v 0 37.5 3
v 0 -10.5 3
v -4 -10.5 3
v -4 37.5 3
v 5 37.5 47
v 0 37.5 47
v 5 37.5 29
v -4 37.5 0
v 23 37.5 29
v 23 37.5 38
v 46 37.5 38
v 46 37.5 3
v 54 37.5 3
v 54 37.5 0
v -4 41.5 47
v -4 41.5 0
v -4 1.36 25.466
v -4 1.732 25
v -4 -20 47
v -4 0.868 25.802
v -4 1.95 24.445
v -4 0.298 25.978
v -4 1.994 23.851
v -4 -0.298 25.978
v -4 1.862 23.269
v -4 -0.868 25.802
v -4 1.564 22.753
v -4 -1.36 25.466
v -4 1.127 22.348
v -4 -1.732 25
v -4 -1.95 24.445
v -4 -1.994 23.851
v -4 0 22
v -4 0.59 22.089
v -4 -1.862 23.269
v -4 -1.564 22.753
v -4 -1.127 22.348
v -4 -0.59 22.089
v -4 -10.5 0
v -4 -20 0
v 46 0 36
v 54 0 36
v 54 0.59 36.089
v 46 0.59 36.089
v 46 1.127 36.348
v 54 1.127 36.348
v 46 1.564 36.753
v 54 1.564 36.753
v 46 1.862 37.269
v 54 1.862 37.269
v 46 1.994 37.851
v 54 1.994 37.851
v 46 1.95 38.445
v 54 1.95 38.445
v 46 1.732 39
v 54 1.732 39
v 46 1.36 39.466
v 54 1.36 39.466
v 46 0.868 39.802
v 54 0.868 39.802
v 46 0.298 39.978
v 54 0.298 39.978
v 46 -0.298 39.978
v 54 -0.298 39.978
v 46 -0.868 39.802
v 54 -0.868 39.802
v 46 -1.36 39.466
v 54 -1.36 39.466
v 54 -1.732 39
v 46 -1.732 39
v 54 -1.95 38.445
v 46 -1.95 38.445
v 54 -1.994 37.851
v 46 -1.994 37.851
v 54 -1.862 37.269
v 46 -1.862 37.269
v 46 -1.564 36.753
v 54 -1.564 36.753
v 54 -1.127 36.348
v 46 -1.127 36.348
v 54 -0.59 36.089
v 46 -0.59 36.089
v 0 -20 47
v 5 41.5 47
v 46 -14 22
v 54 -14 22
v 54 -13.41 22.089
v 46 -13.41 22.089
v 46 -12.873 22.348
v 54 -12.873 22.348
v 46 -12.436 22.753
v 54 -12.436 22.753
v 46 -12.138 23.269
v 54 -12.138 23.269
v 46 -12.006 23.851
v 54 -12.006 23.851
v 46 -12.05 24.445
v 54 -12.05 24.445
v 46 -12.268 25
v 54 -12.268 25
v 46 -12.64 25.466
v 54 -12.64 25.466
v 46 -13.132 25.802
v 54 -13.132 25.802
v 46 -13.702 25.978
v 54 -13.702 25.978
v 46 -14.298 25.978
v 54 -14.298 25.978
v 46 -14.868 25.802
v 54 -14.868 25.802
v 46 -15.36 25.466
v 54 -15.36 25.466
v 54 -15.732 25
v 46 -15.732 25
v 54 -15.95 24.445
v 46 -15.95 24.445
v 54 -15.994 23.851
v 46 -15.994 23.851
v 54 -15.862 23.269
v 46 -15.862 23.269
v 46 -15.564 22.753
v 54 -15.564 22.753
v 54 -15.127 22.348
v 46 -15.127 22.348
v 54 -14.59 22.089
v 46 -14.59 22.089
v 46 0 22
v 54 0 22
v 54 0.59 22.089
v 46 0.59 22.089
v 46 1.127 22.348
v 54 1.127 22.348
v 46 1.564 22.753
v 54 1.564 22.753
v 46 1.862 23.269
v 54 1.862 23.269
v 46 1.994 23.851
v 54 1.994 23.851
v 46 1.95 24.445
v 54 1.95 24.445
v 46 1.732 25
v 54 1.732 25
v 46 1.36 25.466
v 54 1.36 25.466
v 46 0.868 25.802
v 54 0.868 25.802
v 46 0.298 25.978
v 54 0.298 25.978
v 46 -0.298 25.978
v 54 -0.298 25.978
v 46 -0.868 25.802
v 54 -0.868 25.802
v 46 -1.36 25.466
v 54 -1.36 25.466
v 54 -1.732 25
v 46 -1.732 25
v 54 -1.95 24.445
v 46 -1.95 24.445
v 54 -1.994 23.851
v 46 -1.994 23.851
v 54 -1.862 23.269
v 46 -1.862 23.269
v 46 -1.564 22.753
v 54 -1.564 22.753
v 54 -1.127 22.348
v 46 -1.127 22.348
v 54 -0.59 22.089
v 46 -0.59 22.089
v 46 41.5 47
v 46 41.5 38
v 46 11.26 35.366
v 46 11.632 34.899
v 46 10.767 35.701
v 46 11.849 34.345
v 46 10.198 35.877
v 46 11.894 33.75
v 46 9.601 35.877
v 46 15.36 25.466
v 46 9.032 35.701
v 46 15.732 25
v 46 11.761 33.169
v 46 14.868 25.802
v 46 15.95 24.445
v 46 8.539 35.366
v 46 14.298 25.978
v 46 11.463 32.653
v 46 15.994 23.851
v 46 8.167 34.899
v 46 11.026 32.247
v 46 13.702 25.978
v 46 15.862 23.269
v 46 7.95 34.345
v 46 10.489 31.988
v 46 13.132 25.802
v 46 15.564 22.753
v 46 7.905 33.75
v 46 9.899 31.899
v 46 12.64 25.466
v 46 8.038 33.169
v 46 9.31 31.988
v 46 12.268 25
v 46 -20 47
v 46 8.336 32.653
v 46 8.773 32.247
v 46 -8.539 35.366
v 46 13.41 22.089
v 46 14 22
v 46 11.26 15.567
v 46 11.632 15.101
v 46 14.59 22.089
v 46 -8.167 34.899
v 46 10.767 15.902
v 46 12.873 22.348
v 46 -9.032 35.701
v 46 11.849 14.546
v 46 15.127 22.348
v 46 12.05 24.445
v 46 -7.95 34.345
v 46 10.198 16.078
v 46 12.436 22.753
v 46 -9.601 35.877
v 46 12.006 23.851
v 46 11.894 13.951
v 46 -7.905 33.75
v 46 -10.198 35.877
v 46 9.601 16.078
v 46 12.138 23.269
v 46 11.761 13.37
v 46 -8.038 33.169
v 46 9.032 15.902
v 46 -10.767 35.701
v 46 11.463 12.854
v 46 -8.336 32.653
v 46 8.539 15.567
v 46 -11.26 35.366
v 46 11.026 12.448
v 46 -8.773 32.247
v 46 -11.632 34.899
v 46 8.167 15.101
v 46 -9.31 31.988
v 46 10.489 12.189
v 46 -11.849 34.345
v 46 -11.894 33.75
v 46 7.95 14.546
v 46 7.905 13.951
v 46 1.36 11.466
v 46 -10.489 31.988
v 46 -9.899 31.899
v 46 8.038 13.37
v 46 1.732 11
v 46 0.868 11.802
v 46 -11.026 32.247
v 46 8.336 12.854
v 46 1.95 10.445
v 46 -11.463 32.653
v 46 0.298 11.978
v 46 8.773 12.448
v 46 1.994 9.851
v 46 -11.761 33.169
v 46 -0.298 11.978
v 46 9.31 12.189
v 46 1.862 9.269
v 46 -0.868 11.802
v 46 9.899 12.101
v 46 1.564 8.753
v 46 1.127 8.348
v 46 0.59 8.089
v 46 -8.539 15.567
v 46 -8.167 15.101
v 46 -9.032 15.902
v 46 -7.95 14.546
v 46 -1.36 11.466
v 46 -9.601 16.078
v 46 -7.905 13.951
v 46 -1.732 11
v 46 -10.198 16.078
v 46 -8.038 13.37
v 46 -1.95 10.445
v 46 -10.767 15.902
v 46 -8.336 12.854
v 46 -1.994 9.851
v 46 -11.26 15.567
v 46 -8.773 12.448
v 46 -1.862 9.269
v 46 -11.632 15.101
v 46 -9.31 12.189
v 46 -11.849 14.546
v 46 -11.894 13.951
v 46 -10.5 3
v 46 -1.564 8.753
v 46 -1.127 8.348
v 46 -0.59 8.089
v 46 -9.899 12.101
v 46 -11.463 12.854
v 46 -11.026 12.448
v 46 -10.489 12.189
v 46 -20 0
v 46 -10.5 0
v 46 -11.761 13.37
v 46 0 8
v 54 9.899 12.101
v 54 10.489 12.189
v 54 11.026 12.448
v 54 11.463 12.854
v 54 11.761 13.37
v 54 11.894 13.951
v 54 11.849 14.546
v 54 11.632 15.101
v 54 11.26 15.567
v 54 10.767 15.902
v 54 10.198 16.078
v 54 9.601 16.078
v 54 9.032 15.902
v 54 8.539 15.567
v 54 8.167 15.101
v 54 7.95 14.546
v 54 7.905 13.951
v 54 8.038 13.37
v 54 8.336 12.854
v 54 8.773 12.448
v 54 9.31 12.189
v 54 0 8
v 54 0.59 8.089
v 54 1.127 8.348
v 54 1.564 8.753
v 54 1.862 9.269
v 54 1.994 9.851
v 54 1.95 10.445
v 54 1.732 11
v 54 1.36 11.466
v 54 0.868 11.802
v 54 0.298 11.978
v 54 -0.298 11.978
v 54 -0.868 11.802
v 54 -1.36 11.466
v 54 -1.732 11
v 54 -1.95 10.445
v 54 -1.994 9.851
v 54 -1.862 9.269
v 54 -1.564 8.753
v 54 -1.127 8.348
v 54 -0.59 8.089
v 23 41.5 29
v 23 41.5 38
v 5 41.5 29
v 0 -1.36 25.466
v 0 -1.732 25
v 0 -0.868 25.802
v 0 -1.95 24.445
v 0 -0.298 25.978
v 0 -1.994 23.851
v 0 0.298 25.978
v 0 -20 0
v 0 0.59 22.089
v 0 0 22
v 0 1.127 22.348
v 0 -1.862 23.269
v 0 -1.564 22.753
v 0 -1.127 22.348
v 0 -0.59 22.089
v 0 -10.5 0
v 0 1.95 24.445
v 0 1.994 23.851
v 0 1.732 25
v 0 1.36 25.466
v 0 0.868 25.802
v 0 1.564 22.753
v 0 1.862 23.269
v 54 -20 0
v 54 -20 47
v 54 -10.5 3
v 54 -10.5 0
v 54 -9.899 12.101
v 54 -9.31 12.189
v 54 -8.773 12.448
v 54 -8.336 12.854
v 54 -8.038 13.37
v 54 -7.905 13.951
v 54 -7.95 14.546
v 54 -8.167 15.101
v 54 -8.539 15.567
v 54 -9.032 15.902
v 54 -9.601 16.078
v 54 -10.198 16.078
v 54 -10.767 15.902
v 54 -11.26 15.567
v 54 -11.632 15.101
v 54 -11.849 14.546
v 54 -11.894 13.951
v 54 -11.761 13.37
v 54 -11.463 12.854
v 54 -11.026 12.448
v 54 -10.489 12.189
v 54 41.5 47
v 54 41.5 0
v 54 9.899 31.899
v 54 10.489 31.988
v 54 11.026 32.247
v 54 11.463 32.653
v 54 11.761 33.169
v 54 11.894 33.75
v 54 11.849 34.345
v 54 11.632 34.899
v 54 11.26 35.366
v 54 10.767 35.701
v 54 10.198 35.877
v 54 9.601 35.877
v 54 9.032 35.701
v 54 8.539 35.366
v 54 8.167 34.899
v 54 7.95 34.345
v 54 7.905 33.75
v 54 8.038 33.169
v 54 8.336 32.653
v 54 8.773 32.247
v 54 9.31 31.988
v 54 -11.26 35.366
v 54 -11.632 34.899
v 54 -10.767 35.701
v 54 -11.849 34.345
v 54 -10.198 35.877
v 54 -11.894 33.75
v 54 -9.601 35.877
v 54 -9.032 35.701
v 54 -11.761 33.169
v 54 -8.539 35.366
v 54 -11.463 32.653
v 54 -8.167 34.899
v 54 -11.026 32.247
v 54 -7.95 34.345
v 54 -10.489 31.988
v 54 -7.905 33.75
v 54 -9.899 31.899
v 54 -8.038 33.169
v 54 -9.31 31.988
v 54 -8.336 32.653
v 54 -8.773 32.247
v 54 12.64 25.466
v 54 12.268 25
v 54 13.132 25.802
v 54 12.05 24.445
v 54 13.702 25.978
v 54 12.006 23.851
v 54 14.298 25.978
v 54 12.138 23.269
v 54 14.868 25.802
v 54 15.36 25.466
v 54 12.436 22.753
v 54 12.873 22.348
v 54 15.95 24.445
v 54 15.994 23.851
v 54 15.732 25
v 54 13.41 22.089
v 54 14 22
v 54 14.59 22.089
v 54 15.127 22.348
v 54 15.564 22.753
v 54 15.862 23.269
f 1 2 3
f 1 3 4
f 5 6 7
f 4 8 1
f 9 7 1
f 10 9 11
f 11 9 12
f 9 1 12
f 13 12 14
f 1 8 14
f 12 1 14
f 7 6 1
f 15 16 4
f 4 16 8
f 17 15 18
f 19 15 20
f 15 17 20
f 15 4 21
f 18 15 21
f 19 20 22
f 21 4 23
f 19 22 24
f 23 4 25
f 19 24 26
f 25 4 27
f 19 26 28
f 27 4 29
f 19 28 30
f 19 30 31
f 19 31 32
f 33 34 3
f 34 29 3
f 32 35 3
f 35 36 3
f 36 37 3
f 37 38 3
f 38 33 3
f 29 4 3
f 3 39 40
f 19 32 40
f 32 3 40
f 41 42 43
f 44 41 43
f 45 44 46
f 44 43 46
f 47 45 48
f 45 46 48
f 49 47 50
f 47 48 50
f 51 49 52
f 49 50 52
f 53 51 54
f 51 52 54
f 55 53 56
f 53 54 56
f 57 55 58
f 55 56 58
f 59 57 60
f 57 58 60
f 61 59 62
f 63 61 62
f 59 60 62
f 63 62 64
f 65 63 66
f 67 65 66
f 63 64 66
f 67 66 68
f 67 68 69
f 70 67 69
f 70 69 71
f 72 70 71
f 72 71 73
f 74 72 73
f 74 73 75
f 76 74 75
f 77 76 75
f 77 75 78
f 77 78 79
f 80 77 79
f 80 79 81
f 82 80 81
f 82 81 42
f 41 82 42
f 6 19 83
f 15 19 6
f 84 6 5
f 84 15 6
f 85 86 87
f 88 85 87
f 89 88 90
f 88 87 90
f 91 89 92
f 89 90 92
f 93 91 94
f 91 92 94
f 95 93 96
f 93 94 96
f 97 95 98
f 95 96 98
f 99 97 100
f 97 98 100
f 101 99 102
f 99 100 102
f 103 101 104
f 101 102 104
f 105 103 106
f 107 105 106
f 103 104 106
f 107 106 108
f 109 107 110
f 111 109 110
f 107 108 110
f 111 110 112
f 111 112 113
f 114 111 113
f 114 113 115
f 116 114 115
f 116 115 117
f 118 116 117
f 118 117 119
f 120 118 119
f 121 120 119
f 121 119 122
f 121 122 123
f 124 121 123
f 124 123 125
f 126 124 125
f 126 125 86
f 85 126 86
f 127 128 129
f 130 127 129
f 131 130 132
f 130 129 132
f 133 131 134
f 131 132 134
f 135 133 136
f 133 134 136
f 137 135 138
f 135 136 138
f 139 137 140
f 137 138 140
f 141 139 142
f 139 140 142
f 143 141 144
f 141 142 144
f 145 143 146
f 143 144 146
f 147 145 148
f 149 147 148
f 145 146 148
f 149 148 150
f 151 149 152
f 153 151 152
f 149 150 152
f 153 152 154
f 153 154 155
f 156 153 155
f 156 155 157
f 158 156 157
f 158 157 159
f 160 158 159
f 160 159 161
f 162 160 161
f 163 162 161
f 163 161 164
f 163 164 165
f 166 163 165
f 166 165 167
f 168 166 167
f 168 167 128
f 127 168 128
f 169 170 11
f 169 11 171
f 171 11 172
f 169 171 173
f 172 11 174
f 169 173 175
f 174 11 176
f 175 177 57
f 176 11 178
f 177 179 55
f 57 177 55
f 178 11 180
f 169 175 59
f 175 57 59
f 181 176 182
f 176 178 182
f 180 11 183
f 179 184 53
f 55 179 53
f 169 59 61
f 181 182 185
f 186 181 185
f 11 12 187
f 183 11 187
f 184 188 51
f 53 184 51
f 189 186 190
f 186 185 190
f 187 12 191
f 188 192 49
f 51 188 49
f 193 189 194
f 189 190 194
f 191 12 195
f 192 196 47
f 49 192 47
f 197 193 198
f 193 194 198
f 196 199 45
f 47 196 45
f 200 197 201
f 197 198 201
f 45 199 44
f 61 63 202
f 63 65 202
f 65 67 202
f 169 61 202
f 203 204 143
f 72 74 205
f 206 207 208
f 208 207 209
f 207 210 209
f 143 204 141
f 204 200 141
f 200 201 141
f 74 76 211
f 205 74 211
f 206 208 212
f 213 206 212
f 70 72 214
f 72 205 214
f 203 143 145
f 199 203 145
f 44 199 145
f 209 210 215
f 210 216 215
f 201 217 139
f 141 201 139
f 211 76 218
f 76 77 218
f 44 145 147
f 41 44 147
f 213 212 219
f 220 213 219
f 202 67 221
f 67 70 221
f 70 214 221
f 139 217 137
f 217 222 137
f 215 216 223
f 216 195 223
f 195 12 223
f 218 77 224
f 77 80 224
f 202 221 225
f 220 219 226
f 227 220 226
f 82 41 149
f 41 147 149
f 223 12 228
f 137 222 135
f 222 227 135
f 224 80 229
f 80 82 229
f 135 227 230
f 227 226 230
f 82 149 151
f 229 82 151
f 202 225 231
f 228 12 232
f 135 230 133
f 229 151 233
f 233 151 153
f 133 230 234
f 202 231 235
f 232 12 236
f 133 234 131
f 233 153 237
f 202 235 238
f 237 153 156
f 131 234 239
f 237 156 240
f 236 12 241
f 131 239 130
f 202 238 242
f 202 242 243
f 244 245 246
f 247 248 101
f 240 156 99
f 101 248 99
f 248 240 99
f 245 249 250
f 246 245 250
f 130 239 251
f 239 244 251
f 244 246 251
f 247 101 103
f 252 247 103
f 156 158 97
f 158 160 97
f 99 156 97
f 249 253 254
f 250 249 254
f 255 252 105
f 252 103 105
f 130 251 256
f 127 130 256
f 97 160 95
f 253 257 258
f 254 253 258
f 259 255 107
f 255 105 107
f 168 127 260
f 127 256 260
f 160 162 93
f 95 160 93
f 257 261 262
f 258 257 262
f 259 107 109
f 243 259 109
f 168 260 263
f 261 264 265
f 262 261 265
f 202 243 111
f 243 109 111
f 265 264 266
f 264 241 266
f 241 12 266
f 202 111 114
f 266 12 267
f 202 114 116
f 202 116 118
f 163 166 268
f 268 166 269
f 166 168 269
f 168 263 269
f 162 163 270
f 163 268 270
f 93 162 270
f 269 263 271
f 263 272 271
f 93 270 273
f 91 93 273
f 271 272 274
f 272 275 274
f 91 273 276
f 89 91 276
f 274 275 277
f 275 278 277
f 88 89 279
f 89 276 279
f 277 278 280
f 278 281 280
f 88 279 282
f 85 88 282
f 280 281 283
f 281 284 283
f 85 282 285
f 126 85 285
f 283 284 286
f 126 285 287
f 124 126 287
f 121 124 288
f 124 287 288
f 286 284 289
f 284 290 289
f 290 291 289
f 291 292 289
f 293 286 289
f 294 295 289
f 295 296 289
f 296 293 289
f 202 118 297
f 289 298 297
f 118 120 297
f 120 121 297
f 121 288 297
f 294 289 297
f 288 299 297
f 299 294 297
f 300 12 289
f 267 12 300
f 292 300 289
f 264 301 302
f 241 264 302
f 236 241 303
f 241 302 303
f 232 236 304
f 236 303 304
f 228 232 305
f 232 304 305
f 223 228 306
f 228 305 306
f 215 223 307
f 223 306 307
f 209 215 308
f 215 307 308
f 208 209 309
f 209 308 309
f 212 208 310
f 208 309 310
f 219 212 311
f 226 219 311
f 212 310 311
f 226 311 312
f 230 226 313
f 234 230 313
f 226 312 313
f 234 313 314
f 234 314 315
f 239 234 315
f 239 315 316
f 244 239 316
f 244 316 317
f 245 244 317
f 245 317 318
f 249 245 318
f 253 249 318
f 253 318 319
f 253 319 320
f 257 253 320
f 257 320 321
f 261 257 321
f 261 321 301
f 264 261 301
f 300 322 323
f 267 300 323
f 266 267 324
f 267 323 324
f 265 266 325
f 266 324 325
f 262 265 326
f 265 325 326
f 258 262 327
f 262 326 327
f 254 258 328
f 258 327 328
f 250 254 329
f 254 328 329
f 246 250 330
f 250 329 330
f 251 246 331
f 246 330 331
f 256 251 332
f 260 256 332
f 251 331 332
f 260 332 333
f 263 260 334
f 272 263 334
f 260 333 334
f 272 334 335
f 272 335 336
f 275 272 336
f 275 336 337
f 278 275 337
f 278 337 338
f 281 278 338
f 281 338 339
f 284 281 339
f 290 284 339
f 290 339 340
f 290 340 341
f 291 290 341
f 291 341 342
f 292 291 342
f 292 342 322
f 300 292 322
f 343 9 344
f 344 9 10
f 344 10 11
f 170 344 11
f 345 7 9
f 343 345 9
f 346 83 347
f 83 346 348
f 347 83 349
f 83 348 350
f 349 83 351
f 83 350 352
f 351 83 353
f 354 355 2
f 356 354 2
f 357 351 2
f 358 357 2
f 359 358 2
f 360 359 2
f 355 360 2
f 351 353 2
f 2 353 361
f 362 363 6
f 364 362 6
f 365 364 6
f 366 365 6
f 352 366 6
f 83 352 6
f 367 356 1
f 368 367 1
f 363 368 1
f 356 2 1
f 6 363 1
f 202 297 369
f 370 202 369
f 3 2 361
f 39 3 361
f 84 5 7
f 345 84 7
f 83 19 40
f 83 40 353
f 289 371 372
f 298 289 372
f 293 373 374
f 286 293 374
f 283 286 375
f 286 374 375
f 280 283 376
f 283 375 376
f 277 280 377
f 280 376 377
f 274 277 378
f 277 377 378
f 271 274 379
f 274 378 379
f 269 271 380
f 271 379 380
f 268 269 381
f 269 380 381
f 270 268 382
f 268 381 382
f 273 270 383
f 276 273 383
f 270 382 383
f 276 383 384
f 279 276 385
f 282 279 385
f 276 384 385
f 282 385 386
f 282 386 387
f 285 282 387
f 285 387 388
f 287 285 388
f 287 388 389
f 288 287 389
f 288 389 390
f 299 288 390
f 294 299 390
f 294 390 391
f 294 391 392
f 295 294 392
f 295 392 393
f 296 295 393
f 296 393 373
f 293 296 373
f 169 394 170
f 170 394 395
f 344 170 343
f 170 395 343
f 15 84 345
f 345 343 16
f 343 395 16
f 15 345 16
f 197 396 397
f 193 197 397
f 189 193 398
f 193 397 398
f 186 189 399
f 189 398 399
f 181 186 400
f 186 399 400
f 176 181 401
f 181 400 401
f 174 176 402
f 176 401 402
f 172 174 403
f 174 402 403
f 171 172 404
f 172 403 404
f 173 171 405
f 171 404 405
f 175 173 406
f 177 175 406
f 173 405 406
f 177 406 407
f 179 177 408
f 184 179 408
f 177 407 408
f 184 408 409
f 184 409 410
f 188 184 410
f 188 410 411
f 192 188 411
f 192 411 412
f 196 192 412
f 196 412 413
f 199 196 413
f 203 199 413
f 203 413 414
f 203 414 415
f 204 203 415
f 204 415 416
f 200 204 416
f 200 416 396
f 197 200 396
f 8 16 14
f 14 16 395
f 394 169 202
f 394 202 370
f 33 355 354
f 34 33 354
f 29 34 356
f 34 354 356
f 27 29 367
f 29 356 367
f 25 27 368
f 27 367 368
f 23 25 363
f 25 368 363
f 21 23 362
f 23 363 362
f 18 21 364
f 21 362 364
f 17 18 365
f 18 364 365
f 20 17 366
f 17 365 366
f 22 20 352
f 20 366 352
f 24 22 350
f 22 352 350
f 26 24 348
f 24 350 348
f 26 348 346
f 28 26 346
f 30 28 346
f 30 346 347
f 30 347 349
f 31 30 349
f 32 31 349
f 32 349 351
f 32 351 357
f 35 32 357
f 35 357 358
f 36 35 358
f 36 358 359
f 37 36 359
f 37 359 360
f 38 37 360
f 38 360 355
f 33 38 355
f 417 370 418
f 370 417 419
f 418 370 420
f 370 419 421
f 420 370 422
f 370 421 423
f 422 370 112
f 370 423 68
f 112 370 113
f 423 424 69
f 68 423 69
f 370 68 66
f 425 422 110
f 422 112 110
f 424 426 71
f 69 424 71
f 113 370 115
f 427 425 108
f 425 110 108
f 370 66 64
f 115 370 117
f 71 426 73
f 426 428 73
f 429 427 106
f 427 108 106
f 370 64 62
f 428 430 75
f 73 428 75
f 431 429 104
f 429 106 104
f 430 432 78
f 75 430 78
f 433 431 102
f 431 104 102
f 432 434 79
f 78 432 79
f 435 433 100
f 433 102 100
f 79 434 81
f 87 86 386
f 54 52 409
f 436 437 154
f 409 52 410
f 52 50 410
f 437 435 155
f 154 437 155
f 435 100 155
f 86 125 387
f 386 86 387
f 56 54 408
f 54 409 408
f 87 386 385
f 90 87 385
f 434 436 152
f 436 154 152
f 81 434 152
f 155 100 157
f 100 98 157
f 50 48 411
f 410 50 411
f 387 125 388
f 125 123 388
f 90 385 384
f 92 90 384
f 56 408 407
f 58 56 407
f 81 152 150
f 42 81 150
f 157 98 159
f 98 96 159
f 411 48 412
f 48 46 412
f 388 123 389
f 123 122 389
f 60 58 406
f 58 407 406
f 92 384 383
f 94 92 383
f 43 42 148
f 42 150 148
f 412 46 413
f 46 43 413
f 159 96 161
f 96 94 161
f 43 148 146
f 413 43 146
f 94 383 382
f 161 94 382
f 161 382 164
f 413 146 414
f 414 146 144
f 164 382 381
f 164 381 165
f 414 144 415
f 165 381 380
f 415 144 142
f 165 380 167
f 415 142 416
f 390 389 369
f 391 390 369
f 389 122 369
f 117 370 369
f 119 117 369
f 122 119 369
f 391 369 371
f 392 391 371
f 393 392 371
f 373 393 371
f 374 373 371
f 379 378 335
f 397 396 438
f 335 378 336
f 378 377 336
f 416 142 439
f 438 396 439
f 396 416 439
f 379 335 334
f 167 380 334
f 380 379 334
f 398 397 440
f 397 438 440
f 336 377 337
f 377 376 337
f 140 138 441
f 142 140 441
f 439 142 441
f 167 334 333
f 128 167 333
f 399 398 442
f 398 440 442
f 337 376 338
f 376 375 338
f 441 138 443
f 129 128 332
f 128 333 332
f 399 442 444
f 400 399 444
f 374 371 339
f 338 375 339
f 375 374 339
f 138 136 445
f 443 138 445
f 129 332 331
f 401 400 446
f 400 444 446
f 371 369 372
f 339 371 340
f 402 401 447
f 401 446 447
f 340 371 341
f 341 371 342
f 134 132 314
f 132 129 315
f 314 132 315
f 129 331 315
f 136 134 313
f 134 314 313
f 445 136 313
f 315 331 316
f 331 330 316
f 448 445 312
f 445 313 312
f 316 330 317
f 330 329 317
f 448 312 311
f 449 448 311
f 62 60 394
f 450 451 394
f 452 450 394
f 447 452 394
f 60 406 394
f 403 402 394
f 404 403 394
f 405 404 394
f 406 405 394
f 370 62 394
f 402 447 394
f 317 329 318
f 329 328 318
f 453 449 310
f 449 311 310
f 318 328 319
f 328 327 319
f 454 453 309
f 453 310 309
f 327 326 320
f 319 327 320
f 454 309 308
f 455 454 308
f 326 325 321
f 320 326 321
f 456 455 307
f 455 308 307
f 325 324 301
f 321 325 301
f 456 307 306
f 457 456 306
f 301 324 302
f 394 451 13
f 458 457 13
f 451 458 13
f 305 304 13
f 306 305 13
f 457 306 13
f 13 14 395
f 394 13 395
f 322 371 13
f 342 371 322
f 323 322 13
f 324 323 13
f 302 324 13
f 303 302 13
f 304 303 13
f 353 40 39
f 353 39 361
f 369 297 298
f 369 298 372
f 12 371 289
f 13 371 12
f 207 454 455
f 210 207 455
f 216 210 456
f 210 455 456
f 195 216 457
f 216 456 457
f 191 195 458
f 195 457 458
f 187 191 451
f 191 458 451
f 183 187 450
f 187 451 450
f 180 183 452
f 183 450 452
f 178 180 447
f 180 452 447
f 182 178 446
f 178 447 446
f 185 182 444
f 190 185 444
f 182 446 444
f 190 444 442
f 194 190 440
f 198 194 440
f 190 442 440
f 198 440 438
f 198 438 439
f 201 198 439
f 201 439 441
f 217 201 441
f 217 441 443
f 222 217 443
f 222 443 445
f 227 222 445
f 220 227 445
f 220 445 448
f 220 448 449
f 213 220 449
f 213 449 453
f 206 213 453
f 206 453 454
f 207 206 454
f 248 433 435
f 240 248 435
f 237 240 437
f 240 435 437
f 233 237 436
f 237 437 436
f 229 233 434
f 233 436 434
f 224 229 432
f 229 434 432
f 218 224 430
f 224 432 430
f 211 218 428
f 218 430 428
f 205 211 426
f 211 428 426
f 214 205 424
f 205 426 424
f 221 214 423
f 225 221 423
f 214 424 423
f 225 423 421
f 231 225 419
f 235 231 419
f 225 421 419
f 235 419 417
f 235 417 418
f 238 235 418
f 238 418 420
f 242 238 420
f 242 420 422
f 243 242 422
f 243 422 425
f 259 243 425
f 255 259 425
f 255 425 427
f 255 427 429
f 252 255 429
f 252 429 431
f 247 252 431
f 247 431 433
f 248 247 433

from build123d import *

# Parameters (mm, degrees)
EXTRUSION1_DEPTH = 47
ESQUISSE2_R      = 2
ESQUISSE2_W      = 3
ESQUISSE2_H      = 48
EXTRUSION2_DEPTH = 59
EXTRUSION3_REACH = 60
ESQUISSE3_R      = 2
EXTRUSION4_DEPTH = 5


with BuildPart() as part:
    # Esquisse1 → Extrusion1 (new body)
    with BuildSketch(Plane.XY):
        Polygon((0, -20), (0, 37.5), (46, 37.5), (46, -20), (54, -20), (54, 41.5), (-4, 41.5), (-4, -20), align=None)
    extrude(amount=EXTRUSION1_DEPTH)

    # Esquisse2 → Extrusion2 (cut, through all)
    with BuildSketch(Plane(origin=(54, 0, 0), x_dir=(0, 0, -1), z_dir=(1, 0, 0))):
        with Locations((-24, 0)):
            Circle(ESQUISSE2_R)
        with Locations((-1.5, 13.5)):
            Rectangle(ESQUISSE2_W, ESQUISSE2_H)
    extrude(amount=-EXTRUSION2_DEPTH, mode=Mode.SUBTRACT)

    # Esquisse3 → Extrusion3 (cut, up to next)
    with BuildSketch(Plane(origin=(54, 0, 0), x_dir=(0, 0, -1), z_dir=(1, 0, 0)), mode=Mode.PRIVATE) as extrusion3_sk1:
        with Locations((-24, 14)):
            Circle(ESQUISSE3_R)
    extrusion3_tool1 = extrude(extrusion3_sk1.sketch, amount=-EXTRUSION3_REACH, mode=Mode.PRIVATE) & part.part
    add(extrusion3_tool1.solids().sort_by_distance((54, 14, 24))[0], mode=Mode.SUBTRACT)
    # Esquisse3 → Extrusion3 (cut, up to next)
    with BuildSketch(Plane(origin=(54, 0, 0), x_dir=(0, 0, -1), z_dir=(1, 0, 0)), mode=Mode.PRIVATE) as extrusion3_sk2:
        with Locations((-14.100505063, 9.899494937)):
            Circle(ESQUISSE3_R)
    extrusion3_tool2 = extrude(extrusion3_sk2.sketch, amount=-EXTRUSION3_REACH, mode=Mode.PRIVATE) & part.part
    add(extrusion3_tool2.solids().sort_by_distance((54, 9.899495, 14.100505))[0], mode=Mode.SUBTRACT)
    # Esquisse3 → Extrusion3 (cut, up to next)
    with BuildSketch(Plane(origin=(54, 0, 0), x_dir=(0, 0, -1), z_dir=(1, 0, 0)), mode=Mode.PRIVATE) as extrusion3_sk3:
        with Locations((-10, 0)):
            Circle(ESQUISSE3_R)
    extrusion3_tool3 = extrude(extrusion3_sk3.sketch, amount=-EXTRUSION3_REACH, mode=Mode.PRIVATE) & part.part
    add(extrusion3_tool3.solids().sort_by_distance((54, 0, 10))[0], mode=Mode.SUBTRACT)
    # Esquisse3 → Extrusion3 (cut, up to next)
    with BuildSketch(Plane(origin=(54, 0, 0), x_dir=(0, 0, -1), z_dir=(1, 0, 0)), mode=Mode.PRIVATE) as extrusion3_sk4:
        with Locations((-14.100505063, -9.899494937)):
            Circle(ESQUISSE3_R)
    extrusion3_tool4 = extrude(extrusion3_sk4.sketch, amount=-EXTRUSION3_REACH, mode=Mode.PRIVATE) & part.part
    add(extrusion3_tool4.solids().sort_by_distance((54, -9.899495, 14.100505))[0], mode=Mode.SUBTRACT)
    # Esquisse3 → Extrusion3 (cut, up to next)
    with BuildSketch(Plane(origin=(54, 0, 0), x_dir=(0, 0, -1), z_dir=(1, 0, 0)), mode=Mode.PRIVATE) as extrusion3_sk5:
        with Locations((-24, -14)):
            Circle(ESQUISSE3_R)
    extrusion3_tool5 = extrude(extrusion3_sk5.sketch, amount=-EXTRUSION3_REACH, mode=Mode.PRIVATE) & part.part
    add(extrusion3_tool5.solids().sort_by_distance((54, -14, 24))[0], mode=Mode.SUBTRACT)
    # Esquisse3 → Extrusion3 (cut, up to next)
    with BuildSketch(Plane(origin=(54, 0, 0), x_dir=(0, 0, -1), z_dir=(1, 0, 0)), mode=Mode.PRIVATE) as extrusion3_sk6:
        with Locations((-33.899494937, -9.899494937)):
            Circle(ESQUISSE3_R)
    extrusion3_tool6 = extrude(extrusion3_sk6.sketch, amount=-EXTRUSION3_REACH, mode=Mode.PRIVATE) & part.part
    add(extrusion3_tool6.solids().sort_by_distance((54, -9.899495, 33.899495))[0], mode=Mode.SUBTRACT)
    # Esquisse3 → Extrusion3 (cut, up to next)
    with BuildSketch(Plane(origin=(54, 0, 0), x_dir=(0, 0, -1), z_dir=(1, 0, 0)), mode=Mode.PRIVATE) as extrusion3_sk7:
        with Locations((-38, 0)):
            Circle(ESQUISSE3_R)
    extrusion3_tool7 = extrude(extrusion3_sk7.sketch, amount=-EXTRUSION3_REACH, mode=Mode.PRIVATE) & part.part
    add(extrusion3_tool7.solids().sort_by_distance((54, 0, 38))[0], mode=Mode.SUBTRACT)
    # Esquisse3 → Extrusion3 (cut, up to next)
    with BuildSketch(Plane(origin=(54, 0, 0), x_dir=(0, 0, -1), z_dir=(1, 0, 0)), mode=Mode.PRIVATE) as extrusion3_sk8:
        with Locations((-33.899494937, 9.899494937)):
            Circle(ESQUISSE3_R)
    extrusion3_tool8 = extrude(extrusion3_sk8.sketch, amount=-EXTRUSION3_REACH, mode=Mode.PRIVATE) & part.part
    add(extrusion3_tool8.solids().sort_by_distance((54, 9.899495, 33.899495))[0], mode=Mode.SUBTRACT)

    # Esquisse4 → Extrusion4 (cut, through all)
    with BuildSketch(Plane.XZ.offset(-37.5)):
        Polygon((5, 47), (5, 29), (23, 29), (23, 38), (46, 38), (46, 47), (23, 47), align=None)
    extrude(amount=-EXTRUSION4_DEPTH, mode=Mode.SUBTRACT)


solid = part.part
